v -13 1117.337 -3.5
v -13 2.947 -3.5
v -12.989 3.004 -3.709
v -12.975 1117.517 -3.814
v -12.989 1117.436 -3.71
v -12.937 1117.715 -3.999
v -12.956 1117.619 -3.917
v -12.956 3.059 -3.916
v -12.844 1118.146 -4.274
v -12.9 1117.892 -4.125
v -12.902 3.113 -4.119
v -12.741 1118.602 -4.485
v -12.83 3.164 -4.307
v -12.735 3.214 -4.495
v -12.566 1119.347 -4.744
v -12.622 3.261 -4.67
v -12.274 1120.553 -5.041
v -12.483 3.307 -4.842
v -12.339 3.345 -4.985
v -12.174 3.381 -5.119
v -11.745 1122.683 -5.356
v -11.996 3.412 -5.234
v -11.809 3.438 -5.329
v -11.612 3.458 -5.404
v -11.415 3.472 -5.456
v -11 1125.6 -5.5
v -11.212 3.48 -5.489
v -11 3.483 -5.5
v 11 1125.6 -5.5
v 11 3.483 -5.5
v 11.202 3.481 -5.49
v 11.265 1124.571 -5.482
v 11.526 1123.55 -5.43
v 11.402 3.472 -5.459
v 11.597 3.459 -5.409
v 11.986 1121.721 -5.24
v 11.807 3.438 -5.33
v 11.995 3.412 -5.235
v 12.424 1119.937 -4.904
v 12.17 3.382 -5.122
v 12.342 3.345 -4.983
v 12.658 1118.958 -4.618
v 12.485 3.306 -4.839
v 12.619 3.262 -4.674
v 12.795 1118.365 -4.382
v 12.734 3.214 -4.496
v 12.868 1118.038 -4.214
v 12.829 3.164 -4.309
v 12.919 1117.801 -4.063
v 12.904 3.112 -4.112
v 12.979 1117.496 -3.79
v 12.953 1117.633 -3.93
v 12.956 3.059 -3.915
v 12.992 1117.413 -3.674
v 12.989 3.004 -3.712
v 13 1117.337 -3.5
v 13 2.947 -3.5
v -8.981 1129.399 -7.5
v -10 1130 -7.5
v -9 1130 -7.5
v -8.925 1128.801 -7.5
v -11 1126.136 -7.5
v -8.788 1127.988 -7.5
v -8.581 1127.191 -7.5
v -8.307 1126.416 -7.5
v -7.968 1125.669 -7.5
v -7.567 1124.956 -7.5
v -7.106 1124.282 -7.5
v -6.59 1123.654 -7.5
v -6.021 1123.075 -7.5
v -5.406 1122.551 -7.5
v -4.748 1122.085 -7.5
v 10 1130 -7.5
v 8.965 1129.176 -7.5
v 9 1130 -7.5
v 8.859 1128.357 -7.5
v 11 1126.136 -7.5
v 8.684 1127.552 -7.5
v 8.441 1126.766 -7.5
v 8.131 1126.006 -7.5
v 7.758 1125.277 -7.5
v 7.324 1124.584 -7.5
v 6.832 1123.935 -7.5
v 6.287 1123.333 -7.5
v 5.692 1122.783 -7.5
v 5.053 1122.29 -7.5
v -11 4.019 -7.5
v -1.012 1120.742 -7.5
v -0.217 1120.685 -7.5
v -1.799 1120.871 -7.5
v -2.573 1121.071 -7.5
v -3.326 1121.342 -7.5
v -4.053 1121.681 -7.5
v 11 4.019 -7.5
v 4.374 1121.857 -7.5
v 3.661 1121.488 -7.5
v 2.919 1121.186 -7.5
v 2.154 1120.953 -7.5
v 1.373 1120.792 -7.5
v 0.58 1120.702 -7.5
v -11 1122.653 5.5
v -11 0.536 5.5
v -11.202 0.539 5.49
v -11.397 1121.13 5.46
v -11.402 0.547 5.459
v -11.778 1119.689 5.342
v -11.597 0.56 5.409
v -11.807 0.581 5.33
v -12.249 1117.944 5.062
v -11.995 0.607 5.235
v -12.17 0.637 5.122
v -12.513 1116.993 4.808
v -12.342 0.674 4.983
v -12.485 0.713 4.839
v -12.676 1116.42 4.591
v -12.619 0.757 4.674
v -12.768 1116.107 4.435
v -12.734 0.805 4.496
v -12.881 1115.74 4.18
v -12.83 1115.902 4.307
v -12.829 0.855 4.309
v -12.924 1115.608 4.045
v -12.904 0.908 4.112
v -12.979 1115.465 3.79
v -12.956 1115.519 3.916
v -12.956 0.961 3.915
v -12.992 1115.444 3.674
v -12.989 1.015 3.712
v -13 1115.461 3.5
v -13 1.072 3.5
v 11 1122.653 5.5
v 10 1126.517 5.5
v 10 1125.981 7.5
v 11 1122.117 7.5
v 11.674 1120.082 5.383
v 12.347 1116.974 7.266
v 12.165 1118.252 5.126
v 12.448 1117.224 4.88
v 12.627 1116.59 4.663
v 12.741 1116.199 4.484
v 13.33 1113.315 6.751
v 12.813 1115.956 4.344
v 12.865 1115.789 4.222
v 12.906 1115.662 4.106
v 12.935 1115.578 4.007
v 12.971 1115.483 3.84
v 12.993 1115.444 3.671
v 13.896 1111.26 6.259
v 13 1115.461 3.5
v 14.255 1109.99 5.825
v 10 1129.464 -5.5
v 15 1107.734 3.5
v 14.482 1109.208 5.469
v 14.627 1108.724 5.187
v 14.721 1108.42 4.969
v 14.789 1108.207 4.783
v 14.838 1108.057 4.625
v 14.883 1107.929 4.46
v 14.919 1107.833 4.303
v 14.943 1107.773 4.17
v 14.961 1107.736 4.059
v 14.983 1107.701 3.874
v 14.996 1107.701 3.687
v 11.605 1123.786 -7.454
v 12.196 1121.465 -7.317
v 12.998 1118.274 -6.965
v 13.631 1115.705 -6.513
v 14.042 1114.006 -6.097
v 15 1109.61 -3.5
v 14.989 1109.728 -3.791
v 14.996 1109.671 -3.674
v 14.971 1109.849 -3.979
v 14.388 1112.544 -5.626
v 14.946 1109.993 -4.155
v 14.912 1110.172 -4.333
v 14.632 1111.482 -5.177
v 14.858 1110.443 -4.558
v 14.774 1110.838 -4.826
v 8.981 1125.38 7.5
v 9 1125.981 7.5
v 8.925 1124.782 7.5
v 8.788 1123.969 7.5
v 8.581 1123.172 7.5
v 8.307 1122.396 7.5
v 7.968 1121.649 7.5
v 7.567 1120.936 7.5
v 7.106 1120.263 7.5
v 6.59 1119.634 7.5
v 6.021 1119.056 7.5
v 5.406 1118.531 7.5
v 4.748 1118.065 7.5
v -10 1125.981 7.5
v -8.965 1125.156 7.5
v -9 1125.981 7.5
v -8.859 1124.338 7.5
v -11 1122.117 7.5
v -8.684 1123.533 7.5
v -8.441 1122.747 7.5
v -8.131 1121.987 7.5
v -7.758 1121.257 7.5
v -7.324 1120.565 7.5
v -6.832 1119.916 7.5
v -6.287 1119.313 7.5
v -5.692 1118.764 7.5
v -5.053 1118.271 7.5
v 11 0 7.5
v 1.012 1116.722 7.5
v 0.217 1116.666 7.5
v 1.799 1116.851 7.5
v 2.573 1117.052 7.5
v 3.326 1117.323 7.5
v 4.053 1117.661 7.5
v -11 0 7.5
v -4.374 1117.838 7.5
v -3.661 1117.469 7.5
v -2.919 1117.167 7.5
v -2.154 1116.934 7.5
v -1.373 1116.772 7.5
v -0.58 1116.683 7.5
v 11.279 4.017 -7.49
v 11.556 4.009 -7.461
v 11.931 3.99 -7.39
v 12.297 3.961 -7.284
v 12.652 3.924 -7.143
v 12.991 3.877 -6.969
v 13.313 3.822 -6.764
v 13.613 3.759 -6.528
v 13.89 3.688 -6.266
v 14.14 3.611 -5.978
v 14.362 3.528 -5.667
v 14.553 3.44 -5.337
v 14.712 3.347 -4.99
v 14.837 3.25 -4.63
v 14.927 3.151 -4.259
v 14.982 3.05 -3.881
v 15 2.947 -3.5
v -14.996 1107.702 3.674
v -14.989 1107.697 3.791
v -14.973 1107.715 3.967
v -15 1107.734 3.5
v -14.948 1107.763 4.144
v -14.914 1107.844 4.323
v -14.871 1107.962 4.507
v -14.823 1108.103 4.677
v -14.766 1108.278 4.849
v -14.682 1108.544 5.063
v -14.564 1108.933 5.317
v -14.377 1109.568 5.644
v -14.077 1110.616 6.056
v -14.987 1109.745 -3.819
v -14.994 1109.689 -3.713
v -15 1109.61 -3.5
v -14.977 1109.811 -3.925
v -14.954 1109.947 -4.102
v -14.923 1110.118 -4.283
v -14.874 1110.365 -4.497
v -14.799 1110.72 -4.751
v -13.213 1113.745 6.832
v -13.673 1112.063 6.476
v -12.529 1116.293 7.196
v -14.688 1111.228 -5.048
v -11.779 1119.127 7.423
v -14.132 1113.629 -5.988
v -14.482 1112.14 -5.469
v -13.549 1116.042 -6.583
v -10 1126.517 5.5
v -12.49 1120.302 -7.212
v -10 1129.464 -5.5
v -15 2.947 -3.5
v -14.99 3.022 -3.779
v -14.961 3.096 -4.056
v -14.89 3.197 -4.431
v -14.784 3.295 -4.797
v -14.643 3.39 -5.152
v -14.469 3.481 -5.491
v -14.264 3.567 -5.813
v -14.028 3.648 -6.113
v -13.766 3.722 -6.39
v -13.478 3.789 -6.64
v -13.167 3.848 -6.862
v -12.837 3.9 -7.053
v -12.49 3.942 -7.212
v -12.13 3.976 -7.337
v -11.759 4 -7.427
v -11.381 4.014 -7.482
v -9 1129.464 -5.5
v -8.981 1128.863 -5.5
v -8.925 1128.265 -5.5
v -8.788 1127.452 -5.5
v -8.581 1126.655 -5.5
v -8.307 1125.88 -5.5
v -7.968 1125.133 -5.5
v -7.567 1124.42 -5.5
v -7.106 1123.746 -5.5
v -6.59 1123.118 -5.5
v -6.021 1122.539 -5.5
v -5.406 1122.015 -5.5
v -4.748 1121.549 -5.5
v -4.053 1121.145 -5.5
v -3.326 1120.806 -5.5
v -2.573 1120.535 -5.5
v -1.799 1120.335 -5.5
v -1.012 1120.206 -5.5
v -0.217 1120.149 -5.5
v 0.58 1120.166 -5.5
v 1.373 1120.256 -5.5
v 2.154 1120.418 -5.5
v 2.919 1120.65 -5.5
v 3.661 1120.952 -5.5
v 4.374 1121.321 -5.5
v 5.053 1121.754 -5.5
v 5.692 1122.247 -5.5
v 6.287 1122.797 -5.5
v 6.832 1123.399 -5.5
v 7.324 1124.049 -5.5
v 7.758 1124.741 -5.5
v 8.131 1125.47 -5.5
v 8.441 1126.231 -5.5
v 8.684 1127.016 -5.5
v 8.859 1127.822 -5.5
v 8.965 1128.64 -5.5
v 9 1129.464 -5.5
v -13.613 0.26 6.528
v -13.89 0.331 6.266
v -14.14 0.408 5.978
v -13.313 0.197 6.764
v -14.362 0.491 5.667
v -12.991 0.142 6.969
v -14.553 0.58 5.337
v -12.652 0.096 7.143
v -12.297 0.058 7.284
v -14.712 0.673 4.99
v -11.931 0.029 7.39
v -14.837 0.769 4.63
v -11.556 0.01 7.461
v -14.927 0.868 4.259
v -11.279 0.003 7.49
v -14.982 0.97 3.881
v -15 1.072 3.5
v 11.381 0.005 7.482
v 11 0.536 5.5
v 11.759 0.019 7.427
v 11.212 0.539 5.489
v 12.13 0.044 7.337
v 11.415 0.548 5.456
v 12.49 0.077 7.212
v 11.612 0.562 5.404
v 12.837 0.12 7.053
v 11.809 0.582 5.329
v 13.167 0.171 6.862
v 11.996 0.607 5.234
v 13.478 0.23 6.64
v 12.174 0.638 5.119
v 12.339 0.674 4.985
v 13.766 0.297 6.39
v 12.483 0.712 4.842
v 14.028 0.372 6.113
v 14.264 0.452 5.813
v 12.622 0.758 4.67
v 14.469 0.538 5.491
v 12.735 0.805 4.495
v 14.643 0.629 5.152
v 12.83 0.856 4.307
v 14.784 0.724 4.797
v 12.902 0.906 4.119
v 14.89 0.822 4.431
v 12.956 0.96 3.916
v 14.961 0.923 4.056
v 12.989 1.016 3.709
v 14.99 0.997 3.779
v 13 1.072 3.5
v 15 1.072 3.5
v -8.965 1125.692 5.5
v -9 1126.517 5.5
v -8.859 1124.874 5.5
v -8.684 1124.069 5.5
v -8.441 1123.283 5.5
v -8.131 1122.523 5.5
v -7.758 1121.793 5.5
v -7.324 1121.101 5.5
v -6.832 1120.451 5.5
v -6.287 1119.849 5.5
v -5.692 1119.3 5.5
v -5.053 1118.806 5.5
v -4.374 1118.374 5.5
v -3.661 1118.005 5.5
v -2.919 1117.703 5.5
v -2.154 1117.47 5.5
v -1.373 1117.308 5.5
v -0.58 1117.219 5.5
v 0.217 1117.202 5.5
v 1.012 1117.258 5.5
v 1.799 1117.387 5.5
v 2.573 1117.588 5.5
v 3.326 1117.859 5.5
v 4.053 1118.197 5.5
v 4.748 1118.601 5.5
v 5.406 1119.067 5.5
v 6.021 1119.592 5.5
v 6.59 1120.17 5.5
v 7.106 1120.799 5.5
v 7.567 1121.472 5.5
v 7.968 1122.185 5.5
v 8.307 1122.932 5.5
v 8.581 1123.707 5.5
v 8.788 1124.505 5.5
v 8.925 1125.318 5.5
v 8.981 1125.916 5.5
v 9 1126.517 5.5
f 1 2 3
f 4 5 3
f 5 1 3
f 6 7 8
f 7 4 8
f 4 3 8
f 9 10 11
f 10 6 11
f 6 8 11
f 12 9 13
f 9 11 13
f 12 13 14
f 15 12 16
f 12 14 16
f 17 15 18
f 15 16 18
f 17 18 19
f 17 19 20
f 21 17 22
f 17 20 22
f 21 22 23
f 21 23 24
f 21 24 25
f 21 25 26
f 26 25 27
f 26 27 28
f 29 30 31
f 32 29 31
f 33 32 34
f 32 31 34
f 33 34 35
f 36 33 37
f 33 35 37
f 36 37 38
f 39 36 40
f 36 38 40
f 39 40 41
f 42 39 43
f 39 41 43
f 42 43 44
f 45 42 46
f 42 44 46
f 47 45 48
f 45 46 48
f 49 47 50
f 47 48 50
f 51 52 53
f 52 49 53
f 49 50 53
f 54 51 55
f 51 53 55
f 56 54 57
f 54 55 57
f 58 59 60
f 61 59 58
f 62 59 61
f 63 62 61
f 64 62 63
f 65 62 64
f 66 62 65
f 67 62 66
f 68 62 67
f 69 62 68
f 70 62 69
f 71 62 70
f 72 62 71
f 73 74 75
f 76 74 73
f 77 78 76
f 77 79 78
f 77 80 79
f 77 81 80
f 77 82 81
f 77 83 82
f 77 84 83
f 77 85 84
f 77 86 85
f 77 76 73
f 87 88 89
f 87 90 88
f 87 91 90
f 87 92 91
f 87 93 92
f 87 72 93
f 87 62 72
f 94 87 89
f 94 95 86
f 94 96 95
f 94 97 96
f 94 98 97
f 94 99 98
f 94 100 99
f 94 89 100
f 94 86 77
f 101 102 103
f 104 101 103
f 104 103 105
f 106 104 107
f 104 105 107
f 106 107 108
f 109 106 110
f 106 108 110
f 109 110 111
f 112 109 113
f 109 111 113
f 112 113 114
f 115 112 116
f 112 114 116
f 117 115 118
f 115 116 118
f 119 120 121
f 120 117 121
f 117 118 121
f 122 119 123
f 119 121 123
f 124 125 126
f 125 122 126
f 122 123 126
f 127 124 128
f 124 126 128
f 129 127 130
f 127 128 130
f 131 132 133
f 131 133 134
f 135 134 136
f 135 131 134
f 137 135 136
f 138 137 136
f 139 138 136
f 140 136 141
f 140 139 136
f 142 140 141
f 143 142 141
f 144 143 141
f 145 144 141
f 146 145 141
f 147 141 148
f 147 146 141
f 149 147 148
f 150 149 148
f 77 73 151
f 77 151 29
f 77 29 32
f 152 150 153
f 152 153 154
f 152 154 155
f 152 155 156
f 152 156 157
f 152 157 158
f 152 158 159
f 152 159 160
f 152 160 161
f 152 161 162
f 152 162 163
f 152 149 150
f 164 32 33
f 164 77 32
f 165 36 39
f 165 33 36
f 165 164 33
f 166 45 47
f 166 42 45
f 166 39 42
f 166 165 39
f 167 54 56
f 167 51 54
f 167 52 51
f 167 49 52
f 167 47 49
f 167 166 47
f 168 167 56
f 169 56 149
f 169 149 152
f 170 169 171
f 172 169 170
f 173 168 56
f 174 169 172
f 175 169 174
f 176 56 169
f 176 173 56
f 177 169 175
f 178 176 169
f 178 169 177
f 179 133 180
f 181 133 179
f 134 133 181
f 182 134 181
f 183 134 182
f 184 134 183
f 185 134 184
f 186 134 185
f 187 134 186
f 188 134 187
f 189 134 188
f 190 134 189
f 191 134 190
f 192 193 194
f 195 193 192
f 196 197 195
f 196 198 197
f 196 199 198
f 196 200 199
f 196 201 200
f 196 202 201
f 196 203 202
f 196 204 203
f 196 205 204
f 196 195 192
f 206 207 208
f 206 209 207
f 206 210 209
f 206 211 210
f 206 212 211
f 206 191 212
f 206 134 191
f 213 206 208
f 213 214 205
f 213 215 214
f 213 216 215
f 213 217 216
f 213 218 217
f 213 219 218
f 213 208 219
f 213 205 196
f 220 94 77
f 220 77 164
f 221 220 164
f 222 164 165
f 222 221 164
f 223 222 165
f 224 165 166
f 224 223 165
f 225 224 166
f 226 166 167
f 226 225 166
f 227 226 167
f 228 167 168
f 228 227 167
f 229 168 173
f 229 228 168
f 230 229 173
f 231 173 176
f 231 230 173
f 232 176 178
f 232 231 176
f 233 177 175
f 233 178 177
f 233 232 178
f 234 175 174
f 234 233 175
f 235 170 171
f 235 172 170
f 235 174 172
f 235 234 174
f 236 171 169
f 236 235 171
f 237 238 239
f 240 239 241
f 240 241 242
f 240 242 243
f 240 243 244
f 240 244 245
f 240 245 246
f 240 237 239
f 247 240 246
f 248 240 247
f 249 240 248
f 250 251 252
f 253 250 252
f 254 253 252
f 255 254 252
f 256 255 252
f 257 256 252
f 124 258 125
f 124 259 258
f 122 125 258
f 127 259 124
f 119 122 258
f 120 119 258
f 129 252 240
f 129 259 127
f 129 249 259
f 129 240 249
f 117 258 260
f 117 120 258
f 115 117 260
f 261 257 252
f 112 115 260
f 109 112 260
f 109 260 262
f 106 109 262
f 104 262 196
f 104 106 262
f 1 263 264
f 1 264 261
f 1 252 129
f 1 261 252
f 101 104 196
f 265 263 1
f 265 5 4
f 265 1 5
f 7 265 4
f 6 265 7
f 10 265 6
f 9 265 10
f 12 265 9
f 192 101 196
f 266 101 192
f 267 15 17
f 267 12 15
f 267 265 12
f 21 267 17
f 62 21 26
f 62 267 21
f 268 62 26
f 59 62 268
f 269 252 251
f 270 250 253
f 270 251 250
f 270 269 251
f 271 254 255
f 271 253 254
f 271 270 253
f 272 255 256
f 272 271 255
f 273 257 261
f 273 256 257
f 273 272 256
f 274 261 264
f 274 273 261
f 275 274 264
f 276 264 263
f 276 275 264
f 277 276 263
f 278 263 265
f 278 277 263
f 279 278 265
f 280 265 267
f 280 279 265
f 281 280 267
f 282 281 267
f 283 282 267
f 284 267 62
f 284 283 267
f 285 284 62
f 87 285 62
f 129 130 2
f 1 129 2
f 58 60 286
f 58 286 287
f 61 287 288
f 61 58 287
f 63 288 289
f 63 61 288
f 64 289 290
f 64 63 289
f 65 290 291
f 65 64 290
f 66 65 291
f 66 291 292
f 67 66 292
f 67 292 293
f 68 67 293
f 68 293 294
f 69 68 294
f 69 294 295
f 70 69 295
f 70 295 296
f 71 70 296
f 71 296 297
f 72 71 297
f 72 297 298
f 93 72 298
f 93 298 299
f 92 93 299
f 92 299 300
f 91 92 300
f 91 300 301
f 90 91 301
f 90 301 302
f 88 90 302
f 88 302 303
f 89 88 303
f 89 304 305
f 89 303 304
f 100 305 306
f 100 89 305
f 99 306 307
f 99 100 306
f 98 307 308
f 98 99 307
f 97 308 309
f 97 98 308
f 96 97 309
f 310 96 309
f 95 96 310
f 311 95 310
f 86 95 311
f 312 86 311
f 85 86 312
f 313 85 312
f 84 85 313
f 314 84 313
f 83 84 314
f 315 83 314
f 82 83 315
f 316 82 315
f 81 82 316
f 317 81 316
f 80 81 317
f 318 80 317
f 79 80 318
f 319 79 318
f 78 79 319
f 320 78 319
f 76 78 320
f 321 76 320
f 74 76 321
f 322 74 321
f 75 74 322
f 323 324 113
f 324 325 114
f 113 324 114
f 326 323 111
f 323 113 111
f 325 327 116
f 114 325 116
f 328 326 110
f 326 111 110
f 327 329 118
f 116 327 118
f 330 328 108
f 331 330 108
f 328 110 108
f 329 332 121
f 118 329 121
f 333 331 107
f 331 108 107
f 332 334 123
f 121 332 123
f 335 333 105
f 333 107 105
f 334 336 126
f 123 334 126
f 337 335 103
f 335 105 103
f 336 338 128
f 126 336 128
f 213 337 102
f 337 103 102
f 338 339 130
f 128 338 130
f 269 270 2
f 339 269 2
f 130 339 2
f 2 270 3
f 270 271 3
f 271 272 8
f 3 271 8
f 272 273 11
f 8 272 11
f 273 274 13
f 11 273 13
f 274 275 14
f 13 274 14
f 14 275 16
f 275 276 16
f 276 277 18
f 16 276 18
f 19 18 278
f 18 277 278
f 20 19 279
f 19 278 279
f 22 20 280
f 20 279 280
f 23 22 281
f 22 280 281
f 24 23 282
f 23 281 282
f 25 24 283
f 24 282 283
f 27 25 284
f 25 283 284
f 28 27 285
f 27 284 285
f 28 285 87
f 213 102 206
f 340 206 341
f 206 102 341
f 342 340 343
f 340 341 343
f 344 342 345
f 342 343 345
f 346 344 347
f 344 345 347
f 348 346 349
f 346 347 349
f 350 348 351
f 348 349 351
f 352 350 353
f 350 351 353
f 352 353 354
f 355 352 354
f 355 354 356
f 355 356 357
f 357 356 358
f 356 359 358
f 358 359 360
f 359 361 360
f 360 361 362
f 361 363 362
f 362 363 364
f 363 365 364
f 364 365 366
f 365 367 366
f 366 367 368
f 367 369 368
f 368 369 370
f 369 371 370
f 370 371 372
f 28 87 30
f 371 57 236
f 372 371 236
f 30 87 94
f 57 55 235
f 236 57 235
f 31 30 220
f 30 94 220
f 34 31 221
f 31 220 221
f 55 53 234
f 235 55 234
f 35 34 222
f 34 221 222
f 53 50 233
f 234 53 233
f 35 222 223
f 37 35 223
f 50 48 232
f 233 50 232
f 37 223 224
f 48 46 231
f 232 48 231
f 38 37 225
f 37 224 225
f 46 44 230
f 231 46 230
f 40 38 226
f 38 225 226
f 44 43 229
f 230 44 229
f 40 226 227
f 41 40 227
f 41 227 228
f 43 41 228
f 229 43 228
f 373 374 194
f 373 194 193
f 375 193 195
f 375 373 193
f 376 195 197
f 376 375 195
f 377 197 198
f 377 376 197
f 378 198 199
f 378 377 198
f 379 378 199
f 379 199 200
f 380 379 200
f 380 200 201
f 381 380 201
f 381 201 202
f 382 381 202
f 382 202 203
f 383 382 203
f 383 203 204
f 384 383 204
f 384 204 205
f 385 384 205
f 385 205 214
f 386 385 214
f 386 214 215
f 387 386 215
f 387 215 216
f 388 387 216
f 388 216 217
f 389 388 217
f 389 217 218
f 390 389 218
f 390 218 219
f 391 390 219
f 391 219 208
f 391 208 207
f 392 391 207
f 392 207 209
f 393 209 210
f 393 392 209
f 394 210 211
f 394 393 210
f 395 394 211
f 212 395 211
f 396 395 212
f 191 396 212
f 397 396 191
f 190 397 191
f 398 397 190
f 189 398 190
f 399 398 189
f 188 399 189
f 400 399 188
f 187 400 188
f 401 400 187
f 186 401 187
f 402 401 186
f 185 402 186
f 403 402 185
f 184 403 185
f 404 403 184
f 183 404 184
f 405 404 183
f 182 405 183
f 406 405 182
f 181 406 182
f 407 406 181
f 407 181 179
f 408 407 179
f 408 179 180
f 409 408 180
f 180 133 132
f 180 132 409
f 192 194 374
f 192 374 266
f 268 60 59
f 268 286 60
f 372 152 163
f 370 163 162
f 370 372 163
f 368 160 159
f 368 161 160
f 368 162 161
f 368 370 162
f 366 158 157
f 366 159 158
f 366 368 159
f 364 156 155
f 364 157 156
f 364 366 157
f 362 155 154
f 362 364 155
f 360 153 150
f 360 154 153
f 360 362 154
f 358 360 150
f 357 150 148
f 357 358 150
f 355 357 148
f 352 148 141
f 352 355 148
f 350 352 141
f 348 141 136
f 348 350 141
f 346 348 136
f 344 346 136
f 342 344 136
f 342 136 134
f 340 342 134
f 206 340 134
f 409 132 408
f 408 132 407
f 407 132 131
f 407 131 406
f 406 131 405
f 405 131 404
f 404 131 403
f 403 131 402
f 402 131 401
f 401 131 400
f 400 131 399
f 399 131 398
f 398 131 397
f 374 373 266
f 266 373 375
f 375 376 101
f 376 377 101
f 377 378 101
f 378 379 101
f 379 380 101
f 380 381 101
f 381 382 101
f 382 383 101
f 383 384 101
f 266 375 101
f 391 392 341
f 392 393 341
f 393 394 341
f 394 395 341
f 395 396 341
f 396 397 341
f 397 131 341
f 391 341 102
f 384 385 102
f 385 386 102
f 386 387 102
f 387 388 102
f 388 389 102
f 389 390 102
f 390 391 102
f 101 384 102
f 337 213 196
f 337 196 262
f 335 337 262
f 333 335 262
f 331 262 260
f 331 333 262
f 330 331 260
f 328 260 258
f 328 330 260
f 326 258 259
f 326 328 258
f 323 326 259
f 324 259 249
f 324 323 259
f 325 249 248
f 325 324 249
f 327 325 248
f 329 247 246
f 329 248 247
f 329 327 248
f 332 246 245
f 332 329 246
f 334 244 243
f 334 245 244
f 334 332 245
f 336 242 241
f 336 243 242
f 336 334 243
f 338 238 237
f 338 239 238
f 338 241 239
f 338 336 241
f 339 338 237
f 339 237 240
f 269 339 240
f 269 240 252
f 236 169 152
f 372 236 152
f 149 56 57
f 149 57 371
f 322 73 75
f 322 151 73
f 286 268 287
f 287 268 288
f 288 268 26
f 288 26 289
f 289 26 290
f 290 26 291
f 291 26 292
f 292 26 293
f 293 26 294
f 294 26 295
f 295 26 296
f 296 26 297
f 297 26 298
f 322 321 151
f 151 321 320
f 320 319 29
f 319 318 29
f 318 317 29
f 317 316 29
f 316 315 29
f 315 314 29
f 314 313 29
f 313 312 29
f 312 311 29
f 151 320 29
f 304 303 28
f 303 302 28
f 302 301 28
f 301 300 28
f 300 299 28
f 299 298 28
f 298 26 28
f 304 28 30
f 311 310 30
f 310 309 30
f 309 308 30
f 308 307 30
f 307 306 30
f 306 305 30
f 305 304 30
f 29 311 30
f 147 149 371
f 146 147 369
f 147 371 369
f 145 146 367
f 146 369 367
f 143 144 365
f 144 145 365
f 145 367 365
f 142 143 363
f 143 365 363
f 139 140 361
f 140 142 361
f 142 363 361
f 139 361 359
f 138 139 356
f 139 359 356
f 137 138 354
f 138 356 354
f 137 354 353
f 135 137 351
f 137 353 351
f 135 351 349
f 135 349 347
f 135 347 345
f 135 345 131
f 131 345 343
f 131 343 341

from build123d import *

# Parameters (mm, degrees)
EXTRUDE_1_DEPTH     = 1130
CUT_EXTRUDE_1_DEPTH = 40


with BuildPart() as part:
    # Эскиз1 → Вытянуть-Тонкостенный1 (new body)
    with BuildSketch(Plane(origin=(0, 0, 0), x_dir=(1, 0, 0), z_dir=(0, 1, 0))):
        with BuildLine():
            Line((-11, 7.5), (11, 7.5))
            ThreePointArc((11, 7.5), (13.828427125, 6.328427125), (15, 3.5))
            Line((15, 3.5), (15, -3.5))
            ThreePointArc((15, -3.5), (13.828427125, -6.328427125), (11, -7.5))
            Line((11, -7.5), (-11, -7.5))
            ThreePointArc((-11, -7.5), (-13.828427125, -6.328427125), (-15, -3.5))
            Line((-15, -3.5), (-15, 3.5))
            ThreePointArc((-15, 3.5), (-13.828427125, 6.328427125), (-11, 7.5))
        make_face()
        with BuildLine():
            Line((-11, 5.5), (11, 5.5))
            ThreePointArc((11, 5.5), (12.414213562, 4.914213562), (13, 3.5))
            Line((13, 3.5), (13, -3.5))
            ThreePointArc((13, -3.5), (12.414213562, -4.914213562), (11, -5.5))
            Line((11, -5.5), (-11, -5.5))
            ThreePointArc((-11, -5.5), (-12.414213562, -4.914213562), (-13, -3.5))
            Line((-13, -3.5), (-13, 3.5))
            ThreePointArc((-13, 3.5), (-12.414213562, 4.914213562), (-11, 5.5))
        make_face(mode=Mode.SUBTRACT)
    extrude(amount=EXTRUDE_1_DEPTH)

    # Surface Cut 2
    split(bisect_by=Plane(origin=(0, 1052.429353138, 281.997595264), x_dir=(-1, 0, 0), z_dir=(0, 0.9659258262890681, 0.25881904510252135)), keep=Keep.BOTTOM)

    # Эскиз4 → Вырез-Вытянуть1 (cut)
    with BuildSketch(Plane(origin=(0, 77.570646862, -289.497595264), x_dir=(-1, 0, 0), z_dir=(0, 0.25881904510252135, -0.9659258262890681))):
        with BuildLine():
            Line((-9, 1089.555040868), (-10, 1089.555040868))
            Line((-10, 1089.555040868), (-20, 1052.234532793))
            Line((-20, 1052.234532793), (-20, 1094.555040868))
            Line((-20, 1094.555040868), (20, 1094.555040868))
            Line((20, 1094.555040868), (20, 1052.234532793))
            Line((20, 1052.234532793), (10, 1089.555040868))
            Line((10, 1089.555040868), (9, 1089.555040868))
            ThreePointArc((9, 1089.555040868), (0, 1080.555040868), (-9, 1089.555040868))
        make_face()
    extrude(amount=-CUT_EXTRUDE_1_DEPTH, mode=Mode.SUBTRACT)

    # Surface Cut 3
    split(bisect_by=Plane(origin=(0, 1.875, 0.502404736), x_dir=(1, 0, 0), z_dir=(0, 0.9659258262890691, 0.25881904510251796)), keep=Keep.TOP)


solid = part.part
